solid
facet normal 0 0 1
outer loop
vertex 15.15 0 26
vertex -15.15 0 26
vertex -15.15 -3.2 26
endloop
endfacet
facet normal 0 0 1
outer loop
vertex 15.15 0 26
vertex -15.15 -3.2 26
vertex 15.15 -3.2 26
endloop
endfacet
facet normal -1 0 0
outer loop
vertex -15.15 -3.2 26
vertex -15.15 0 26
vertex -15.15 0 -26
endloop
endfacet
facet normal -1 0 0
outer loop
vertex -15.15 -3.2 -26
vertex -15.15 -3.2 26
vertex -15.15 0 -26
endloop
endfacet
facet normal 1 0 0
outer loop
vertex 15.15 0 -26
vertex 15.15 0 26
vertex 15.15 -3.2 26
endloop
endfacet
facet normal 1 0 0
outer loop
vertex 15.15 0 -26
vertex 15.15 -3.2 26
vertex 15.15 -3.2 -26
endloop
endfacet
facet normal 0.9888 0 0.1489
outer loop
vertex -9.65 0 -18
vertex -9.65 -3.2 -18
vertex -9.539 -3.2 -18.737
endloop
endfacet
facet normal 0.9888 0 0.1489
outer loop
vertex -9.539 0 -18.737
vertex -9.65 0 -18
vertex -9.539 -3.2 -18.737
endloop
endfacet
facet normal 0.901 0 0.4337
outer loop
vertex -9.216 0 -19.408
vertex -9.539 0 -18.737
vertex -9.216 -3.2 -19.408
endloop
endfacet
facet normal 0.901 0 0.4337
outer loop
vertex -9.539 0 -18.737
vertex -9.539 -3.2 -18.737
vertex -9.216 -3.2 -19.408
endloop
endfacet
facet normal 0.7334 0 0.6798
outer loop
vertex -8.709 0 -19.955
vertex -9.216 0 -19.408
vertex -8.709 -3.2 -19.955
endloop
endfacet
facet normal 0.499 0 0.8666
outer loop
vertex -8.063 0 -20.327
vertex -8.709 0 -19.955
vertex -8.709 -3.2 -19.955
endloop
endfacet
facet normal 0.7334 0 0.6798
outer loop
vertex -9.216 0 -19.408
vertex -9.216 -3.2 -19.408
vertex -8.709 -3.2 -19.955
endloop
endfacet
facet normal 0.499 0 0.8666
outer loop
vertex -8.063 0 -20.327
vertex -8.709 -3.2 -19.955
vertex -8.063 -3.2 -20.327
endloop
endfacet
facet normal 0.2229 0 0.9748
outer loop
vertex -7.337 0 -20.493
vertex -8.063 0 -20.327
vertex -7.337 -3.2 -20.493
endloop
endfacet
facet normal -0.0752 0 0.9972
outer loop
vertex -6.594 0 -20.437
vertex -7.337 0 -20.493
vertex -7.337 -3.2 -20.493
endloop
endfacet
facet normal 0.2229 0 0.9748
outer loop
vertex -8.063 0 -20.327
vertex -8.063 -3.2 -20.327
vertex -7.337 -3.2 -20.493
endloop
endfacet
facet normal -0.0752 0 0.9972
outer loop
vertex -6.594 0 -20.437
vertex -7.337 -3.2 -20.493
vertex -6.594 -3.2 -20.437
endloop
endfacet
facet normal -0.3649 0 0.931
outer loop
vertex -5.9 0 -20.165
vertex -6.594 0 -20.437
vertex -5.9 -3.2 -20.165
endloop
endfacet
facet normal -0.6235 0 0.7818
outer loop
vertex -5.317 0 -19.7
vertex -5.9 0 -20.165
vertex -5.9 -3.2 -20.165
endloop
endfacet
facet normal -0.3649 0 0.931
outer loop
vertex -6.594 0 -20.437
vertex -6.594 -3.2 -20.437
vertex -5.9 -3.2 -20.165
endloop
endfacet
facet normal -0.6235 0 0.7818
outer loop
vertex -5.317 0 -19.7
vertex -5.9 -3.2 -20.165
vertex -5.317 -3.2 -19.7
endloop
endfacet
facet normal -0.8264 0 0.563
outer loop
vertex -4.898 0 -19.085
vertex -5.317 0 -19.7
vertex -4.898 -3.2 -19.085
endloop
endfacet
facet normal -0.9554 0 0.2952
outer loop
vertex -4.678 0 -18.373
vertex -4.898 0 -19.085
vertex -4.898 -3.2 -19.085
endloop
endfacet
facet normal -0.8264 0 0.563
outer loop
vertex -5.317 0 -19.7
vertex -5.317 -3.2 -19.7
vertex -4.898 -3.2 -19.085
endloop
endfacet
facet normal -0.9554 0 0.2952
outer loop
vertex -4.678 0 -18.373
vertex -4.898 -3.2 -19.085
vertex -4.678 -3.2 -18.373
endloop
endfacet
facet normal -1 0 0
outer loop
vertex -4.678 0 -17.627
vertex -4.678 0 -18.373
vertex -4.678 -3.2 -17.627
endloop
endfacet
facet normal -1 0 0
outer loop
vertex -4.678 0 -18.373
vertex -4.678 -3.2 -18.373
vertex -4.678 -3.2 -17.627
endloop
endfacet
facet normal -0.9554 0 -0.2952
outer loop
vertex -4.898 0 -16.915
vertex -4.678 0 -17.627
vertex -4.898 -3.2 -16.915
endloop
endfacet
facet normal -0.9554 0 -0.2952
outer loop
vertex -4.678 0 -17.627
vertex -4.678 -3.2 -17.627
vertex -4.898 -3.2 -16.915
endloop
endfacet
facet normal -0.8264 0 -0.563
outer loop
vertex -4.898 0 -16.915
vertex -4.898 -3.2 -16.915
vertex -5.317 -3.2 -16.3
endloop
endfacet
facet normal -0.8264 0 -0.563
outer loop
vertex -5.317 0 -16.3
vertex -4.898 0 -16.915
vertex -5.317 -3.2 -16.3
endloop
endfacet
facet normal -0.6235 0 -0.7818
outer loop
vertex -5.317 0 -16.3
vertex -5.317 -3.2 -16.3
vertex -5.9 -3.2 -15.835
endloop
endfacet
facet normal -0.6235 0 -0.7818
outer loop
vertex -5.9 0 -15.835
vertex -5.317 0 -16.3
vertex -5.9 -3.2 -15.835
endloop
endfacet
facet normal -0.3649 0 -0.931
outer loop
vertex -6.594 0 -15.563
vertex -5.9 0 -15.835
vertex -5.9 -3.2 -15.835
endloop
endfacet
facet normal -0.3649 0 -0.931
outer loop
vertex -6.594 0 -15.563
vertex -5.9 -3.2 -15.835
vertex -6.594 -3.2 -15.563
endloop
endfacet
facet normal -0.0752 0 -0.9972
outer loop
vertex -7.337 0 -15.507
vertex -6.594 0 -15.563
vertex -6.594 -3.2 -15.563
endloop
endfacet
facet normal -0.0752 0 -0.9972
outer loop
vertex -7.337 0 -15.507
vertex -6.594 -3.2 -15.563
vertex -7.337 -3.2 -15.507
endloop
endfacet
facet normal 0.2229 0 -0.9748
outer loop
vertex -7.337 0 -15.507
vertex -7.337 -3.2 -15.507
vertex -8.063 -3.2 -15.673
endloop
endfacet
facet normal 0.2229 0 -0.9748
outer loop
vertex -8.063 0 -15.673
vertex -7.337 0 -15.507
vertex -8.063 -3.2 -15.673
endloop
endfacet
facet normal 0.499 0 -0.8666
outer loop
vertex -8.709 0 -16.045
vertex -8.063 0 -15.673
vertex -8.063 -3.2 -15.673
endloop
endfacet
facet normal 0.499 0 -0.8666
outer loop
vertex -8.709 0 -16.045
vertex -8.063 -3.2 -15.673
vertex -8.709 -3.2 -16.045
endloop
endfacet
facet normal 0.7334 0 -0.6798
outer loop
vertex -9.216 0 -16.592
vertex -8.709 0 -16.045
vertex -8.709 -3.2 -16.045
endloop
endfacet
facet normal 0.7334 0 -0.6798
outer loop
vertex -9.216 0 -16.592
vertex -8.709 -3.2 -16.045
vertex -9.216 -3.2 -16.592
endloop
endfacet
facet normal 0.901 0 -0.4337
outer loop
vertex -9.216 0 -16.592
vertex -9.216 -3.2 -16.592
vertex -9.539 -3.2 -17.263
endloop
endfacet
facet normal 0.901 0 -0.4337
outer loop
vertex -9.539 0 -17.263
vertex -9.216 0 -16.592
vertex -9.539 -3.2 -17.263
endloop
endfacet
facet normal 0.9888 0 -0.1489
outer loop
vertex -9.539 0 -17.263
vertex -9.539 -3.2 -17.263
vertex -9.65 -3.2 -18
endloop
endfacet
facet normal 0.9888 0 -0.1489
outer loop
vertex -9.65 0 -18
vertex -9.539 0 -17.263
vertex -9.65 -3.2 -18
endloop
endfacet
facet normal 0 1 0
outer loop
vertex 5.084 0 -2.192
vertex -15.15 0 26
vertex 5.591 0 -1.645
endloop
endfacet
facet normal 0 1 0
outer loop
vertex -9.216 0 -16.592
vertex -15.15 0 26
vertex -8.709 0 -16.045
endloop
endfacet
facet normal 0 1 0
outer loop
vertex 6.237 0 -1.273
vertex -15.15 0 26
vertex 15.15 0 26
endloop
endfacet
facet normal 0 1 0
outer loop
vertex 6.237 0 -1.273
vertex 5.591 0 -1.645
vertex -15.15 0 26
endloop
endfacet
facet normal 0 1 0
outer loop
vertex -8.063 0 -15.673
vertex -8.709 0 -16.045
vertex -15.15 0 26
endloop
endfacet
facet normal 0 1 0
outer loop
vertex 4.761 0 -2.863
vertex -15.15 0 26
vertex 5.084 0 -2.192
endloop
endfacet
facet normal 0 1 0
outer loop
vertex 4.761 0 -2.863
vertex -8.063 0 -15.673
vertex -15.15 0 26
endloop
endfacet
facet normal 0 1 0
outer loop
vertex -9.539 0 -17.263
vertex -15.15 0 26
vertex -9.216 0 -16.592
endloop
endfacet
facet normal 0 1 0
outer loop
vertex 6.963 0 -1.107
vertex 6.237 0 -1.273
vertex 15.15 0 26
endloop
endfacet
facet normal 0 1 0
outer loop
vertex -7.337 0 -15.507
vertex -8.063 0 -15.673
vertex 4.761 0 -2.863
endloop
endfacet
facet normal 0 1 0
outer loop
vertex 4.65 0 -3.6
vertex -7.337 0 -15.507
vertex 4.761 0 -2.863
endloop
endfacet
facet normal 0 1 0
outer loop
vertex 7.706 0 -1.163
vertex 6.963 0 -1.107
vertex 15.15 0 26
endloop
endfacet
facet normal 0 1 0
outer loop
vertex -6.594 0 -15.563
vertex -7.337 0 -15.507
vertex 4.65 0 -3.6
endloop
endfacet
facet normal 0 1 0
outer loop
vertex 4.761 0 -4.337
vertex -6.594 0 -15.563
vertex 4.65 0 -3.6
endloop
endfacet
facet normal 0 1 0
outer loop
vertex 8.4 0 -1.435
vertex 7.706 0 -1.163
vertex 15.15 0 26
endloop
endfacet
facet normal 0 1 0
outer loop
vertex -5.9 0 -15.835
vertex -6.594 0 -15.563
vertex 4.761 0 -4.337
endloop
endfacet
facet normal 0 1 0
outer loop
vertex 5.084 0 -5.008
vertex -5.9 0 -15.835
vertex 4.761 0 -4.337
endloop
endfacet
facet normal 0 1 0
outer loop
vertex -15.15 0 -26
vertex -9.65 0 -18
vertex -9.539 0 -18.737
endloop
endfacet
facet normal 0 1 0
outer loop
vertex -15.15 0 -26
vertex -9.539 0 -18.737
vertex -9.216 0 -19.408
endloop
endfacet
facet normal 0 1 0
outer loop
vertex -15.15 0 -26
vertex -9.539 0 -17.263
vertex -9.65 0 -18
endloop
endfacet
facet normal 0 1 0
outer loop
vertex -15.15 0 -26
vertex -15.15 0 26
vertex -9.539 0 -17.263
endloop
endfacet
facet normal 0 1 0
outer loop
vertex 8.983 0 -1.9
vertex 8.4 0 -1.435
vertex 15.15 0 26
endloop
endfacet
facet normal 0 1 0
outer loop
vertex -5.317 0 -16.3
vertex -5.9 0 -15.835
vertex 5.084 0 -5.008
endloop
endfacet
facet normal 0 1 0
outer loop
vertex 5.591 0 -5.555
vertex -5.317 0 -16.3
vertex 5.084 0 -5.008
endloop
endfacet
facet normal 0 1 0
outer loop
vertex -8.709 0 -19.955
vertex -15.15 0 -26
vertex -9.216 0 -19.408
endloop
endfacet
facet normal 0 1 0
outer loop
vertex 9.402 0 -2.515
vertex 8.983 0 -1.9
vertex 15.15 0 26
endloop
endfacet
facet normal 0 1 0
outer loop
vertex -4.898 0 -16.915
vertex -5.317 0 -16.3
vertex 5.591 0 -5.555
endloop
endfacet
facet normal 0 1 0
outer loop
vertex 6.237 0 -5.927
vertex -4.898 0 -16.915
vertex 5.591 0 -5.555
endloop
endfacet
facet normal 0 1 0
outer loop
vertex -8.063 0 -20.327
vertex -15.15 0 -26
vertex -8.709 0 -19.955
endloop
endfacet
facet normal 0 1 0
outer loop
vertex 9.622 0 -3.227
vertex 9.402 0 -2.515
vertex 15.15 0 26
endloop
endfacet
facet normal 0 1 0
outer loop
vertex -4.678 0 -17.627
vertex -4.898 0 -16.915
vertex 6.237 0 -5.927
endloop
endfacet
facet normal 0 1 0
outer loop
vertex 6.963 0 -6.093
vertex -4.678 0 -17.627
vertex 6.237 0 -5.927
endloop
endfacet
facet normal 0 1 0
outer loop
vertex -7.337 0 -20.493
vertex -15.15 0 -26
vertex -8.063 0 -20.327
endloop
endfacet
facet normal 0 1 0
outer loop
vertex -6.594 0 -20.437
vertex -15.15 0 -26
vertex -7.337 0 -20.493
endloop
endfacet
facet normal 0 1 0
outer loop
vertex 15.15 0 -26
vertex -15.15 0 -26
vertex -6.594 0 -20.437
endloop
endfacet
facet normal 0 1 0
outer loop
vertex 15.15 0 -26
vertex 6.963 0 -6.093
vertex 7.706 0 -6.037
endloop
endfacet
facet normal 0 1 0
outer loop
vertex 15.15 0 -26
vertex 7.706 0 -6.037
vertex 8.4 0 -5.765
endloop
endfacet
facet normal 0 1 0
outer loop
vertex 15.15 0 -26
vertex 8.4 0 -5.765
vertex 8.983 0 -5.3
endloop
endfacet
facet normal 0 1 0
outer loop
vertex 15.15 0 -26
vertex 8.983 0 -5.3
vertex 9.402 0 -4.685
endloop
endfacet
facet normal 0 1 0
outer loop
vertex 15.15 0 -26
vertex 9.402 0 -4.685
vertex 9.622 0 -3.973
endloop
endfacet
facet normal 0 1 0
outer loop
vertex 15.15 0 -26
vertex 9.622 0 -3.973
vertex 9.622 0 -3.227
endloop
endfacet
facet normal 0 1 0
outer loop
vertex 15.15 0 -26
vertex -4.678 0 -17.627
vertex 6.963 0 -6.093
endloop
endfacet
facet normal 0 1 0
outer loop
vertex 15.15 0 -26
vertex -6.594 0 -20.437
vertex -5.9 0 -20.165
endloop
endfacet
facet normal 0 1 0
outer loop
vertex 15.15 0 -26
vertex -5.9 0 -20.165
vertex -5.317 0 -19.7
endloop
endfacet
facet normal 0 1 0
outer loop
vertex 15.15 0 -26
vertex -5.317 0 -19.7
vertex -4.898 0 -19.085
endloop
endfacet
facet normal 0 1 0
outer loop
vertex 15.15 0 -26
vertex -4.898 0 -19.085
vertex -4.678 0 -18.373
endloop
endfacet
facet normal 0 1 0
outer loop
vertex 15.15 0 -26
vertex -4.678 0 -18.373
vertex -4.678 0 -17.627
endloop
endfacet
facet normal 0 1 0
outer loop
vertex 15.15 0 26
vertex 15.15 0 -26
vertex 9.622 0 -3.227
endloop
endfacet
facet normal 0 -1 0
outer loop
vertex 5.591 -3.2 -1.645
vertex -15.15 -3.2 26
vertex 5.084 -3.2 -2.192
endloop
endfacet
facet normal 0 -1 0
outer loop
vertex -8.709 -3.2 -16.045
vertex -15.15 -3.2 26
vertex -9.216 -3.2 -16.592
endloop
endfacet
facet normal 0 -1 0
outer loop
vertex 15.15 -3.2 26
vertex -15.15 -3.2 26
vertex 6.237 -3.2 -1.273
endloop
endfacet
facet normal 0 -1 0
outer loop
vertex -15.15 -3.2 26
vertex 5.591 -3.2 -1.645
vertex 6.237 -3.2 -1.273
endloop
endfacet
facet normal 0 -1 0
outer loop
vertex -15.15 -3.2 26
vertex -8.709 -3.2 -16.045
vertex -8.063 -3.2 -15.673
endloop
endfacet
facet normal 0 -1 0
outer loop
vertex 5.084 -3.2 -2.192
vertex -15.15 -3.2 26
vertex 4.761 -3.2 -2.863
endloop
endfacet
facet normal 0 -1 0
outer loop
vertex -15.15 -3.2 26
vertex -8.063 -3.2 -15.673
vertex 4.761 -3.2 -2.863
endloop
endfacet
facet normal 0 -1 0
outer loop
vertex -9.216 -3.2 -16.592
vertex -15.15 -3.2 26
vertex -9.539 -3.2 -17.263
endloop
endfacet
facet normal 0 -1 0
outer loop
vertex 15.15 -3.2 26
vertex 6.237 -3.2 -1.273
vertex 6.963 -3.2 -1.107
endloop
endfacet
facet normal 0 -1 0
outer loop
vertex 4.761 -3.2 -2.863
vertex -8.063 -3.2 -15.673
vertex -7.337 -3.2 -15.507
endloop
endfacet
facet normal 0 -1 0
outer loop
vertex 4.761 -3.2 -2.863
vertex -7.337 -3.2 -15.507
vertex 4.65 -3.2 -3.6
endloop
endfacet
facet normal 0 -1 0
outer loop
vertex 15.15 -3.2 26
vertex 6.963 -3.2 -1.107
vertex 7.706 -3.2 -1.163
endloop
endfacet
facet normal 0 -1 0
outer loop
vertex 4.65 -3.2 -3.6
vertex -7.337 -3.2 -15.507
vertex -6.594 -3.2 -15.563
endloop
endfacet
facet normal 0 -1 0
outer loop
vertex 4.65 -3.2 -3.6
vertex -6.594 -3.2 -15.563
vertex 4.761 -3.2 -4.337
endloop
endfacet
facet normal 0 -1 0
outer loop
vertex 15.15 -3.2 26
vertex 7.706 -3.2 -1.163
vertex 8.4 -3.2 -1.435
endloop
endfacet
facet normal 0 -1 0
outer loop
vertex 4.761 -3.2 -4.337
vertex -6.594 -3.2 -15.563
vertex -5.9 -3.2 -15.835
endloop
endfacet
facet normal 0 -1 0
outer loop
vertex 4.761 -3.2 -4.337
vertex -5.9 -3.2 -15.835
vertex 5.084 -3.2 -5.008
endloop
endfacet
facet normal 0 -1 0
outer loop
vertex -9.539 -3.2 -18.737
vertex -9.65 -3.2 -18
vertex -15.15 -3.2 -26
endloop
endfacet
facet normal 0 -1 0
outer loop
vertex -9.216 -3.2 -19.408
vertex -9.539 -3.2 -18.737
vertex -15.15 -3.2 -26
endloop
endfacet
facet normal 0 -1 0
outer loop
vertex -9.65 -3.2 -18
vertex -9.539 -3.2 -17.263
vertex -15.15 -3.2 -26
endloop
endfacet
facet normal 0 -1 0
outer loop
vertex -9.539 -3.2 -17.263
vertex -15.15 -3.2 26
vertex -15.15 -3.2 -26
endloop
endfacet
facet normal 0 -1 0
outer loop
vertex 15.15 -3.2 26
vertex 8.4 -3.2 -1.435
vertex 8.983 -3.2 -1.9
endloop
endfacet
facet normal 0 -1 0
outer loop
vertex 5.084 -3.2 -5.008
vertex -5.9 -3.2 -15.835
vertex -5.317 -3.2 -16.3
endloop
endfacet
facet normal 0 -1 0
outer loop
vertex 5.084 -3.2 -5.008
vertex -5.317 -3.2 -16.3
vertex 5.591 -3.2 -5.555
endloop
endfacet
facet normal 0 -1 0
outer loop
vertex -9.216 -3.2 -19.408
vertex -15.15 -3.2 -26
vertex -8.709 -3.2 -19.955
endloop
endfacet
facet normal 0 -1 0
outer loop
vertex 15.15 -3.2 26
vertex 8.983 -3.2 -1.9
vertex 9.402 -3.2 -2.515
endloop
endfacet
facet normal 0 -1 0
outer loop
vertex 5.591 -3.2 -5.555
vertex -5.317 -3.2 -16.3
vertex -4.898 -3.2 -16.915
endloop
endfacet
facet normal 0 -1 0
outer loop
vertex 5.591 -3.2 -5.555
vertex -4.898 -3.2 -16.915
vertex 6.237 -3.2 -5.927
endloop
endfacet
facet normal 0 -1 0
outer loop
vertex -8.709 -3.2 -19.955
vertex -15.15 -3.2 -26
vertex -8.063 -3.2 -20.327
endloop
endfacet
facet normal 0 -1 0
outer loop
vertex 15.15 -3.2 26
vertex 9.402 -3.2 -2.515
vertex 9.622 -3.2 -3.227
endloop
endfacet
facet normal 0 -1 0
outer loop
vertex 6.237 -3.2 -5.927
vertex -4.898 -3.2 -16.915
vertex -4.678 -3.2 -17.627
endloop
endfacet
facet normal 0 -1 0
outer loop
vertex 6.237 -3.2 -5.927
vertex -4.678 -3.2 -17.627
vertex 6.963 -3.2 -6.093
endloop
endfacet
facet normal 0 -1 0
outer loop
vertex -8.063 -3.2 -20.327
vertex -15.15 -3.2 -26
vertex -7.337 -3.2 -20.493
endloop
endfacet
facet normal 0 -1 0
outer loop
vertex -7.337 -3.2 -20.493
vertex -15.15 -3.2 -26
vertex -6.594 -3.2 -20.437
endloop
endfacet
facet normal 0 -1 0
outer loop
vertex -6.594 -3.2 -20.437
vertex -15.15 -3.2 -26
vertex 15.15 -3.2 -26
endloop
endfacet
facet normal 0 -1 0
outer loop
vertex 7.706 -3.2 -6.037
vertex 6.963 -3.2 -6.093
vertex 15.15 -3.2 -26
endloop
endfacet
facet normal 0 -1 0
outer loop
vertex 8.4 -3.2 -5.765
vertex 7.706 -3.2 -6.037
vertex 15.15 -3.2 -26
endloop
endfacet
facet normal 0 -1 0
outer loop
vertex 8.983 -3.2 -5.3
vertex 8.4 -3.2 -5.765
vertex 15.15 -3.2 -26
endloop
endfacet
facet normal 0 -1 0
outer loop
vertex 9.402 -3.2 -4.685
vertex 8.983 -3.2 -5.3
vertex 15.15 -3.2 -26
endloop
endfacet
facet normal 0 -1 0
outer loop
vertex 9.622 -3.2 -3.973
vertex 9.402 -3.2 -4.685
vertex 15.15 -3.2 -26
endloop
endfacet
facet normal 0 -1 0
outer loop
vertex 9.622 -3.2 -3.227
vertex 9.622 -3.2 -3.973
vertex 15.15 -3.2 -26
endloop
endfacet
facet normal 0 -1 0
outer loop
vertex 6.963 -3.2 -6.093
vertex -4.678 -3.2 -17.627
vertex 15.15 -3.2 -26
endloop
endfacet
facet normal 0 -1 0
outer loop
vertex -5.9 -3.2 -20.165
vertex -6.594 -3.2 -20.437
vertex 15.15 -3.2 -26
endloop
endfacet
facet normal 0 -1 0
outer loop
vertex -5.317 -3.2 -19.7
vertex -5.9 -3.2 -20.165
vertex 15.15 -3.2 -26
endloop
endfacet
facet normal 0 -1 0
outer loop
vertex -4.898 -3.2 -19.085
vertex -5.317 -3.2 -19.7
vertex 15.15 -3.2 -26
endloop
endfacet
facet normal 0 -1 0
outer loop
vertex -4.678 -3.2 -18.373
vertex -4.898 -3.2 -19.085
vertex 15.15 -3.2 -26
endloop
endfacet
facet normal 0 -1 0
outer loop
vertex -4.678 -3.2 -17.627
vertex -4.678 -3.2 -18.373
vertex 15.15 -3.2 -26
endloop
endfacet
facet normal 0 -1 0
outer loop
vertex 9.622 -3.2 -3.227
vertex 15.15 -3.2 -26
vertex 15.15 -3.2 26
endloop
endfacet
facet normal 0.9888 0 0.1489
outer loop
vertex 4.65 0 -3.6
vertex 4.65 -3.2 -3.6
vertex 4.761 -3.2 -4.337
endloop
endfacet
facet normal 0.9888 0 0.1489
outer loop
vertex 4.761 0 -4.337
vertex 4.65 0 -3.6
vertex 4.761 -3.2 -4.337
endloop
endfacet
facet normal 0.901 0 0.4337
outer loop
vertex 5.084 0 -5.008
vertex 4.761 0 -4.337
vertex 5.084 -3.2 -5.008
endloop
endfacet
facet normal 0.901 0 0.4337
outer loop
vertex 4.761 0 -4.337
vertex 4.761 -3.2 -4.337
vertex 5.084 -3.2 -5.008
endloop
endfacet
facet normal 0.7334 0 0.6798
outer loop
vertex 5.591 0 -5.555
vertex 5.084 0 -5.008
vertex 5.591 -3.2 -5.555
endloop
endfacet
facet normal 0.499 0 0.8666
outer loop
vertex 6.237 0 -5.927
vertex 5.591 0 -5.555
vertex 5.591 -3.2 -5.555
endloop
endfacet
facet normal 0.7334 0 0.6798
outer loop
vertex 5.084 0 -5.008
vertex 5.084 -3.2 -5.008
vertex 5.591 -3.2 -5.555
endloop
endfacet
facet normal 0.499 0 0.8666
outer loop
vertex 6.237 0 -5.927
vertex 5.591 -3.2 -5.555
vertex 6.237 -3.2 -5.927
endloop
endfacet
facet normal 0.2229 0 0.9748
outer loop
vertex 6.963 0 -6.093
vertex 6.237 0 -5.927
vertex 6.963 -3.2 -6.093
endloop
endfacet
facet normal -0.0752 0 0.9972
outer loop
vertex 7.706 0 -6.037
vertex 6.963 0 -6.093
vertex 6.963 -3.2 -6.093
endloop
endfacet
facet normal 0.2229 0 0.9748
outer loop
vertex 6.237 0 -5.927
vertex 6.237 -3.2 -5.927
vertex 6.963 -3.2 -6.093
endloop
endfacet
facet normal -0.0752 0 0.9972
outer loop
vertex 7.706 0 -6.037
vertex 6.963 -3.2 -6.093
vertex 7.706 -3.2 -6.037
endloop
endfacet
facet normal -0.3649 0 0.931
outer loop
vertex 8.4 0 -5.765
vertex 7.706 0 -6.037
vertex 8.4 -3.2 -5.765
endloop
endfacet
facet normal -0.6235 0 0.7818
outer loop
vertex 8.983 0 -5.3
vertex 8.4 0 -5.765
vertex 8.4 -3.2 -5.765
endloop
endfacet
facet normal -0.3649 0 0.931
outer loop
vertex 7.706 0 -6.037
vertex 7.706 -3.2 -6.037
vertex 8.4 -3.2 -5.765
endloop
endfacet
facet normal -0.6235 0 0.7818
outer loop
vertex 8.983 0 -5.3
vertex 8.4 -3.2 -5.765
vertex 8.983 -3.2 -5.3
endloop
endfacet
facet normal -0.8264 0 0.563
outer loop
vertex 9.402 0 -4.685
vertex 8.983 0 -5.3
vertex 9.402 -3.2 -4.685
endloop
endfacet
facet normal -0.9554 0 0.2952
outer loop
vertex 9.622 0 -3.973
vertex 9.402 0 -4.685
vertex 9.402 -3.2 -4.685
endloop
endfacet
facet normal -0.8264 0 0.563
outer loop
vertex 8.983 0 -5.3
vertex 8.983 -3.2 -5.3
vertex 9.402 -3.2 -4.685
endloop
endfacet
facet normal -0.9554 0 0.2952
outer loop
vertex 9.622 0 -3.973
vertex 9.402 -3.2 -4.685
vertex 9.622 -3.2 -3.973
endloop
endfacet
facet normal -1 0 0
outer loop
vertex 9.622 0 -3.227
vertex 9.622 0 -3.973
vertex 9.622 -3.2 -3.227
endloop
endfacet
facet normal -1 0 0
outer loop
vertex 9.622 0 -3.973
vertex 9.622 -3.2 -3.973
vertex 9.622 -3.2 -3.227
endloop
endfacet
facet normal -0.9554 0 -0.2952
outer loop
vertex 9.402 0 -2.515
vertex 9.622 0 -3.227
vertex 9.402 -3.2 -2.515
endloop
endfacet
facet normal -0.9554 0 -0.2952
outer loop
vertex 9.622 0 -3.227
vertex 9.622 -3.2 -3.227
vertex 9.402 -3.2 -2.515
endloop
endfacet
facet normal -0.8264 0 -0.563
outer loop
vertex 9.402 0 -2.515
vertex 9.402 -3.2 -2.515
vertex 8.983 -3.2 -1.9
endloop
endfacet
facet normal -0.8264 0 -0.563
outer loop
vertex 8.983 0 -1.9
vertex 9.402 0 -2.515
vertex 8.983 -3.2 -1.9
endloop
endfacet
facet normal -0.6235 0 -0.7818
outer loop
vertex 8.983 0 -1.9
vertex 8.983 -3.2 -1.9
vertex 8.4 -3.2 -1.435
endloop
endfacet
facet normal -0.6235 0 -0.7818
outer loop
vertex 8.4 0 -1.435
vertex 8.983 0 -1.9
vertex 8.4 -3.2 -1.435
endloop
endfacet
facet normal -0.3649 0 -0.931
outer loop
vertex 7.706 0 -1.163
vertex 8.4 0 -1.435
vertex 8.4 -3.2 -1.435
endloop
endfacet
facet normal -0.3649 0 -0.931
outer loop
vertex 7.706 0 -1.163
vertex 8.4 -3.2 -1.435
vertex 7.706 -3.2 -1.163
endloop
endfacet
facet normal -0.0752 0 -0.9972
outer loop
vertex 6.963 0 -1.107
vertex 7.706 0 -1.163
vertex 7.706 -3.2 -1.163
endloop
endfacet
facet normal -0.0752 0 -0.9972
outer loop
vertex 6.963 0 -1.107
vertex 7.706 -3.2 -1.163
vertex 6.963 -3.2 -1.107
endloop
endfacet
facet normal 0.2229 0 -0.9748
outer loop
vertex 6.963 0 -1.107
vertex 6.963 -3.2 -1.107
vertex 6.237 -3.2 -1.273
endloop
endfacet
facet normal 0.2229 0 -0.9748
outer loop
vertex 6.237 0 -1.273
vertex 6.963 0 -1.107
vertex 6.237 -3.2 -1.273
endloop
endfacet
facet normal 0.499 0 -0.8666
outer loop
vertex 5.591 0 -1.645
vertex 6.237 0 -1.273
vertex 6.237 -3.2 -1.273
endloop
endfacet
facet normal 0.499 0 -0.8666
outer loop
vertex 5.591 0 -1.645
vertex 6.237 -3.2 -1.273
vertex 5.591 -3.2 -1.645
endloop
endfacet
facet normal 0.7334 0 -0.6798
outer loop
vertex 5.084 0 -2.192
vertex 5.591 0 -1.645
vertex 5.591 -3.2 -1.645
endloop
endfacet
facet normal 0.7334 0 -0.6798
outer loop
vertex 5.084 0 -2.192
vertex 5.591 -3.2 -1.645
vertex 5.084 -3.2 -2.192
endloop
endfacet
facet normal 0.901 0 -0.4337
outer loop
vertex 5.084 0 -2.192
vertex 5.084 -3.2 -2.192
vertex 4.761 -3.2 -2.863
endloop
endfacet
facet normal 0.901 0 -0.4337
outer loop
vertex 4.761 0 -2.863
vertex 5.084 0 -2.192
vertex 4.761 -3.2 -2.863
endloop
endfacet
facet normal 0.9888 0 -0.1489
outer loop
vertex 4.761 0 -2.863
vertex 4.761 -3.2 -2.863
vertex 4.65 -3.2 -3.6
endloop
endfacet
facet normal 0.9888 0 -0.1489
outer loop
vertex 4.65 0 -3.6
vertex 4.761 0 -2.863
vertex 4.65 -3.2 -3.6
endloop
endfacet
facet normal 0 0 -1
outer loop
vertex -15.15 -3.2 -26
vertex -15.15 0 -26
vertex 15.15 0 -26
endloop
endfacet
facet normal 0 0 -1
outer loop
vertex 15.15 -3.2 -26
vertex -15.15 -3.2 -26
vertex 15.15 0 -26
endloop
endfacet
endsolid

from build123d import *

# Parameters (mm, degrees)
SKETCH1_W           = 30.3
SKETCH1_H           = 52
BOSS_EXTRUDE1_DEPTH = 3.2
M6_TAPPED_HOLE1_D   = 5


with BuildPart() as part:
    # Sketch1 → Boss-Extrude1 (new body)
    with BuildSketch(Plane(origin=(0, 0, 0), x_dir=(1, 0, 0), z_dir=(0, 1, 0))):
        Rectangle(SKETCH1_W, SKETCH1_H)
    extrude(amount=-BOSS_EXTRUDE1_DEPTH)

    # M6 Tapped Hole1 (through all)
    with Locations(Plane(origin=(0, 0, 0), x_dir=(1, 0, 0), z_dir=(0, 1, 0))):
        with Locations((-7.15, 18), (7.15, 3.6)):
            Hole(M6_TAPPED_HOLE1_D / 2)


solid = part.part
